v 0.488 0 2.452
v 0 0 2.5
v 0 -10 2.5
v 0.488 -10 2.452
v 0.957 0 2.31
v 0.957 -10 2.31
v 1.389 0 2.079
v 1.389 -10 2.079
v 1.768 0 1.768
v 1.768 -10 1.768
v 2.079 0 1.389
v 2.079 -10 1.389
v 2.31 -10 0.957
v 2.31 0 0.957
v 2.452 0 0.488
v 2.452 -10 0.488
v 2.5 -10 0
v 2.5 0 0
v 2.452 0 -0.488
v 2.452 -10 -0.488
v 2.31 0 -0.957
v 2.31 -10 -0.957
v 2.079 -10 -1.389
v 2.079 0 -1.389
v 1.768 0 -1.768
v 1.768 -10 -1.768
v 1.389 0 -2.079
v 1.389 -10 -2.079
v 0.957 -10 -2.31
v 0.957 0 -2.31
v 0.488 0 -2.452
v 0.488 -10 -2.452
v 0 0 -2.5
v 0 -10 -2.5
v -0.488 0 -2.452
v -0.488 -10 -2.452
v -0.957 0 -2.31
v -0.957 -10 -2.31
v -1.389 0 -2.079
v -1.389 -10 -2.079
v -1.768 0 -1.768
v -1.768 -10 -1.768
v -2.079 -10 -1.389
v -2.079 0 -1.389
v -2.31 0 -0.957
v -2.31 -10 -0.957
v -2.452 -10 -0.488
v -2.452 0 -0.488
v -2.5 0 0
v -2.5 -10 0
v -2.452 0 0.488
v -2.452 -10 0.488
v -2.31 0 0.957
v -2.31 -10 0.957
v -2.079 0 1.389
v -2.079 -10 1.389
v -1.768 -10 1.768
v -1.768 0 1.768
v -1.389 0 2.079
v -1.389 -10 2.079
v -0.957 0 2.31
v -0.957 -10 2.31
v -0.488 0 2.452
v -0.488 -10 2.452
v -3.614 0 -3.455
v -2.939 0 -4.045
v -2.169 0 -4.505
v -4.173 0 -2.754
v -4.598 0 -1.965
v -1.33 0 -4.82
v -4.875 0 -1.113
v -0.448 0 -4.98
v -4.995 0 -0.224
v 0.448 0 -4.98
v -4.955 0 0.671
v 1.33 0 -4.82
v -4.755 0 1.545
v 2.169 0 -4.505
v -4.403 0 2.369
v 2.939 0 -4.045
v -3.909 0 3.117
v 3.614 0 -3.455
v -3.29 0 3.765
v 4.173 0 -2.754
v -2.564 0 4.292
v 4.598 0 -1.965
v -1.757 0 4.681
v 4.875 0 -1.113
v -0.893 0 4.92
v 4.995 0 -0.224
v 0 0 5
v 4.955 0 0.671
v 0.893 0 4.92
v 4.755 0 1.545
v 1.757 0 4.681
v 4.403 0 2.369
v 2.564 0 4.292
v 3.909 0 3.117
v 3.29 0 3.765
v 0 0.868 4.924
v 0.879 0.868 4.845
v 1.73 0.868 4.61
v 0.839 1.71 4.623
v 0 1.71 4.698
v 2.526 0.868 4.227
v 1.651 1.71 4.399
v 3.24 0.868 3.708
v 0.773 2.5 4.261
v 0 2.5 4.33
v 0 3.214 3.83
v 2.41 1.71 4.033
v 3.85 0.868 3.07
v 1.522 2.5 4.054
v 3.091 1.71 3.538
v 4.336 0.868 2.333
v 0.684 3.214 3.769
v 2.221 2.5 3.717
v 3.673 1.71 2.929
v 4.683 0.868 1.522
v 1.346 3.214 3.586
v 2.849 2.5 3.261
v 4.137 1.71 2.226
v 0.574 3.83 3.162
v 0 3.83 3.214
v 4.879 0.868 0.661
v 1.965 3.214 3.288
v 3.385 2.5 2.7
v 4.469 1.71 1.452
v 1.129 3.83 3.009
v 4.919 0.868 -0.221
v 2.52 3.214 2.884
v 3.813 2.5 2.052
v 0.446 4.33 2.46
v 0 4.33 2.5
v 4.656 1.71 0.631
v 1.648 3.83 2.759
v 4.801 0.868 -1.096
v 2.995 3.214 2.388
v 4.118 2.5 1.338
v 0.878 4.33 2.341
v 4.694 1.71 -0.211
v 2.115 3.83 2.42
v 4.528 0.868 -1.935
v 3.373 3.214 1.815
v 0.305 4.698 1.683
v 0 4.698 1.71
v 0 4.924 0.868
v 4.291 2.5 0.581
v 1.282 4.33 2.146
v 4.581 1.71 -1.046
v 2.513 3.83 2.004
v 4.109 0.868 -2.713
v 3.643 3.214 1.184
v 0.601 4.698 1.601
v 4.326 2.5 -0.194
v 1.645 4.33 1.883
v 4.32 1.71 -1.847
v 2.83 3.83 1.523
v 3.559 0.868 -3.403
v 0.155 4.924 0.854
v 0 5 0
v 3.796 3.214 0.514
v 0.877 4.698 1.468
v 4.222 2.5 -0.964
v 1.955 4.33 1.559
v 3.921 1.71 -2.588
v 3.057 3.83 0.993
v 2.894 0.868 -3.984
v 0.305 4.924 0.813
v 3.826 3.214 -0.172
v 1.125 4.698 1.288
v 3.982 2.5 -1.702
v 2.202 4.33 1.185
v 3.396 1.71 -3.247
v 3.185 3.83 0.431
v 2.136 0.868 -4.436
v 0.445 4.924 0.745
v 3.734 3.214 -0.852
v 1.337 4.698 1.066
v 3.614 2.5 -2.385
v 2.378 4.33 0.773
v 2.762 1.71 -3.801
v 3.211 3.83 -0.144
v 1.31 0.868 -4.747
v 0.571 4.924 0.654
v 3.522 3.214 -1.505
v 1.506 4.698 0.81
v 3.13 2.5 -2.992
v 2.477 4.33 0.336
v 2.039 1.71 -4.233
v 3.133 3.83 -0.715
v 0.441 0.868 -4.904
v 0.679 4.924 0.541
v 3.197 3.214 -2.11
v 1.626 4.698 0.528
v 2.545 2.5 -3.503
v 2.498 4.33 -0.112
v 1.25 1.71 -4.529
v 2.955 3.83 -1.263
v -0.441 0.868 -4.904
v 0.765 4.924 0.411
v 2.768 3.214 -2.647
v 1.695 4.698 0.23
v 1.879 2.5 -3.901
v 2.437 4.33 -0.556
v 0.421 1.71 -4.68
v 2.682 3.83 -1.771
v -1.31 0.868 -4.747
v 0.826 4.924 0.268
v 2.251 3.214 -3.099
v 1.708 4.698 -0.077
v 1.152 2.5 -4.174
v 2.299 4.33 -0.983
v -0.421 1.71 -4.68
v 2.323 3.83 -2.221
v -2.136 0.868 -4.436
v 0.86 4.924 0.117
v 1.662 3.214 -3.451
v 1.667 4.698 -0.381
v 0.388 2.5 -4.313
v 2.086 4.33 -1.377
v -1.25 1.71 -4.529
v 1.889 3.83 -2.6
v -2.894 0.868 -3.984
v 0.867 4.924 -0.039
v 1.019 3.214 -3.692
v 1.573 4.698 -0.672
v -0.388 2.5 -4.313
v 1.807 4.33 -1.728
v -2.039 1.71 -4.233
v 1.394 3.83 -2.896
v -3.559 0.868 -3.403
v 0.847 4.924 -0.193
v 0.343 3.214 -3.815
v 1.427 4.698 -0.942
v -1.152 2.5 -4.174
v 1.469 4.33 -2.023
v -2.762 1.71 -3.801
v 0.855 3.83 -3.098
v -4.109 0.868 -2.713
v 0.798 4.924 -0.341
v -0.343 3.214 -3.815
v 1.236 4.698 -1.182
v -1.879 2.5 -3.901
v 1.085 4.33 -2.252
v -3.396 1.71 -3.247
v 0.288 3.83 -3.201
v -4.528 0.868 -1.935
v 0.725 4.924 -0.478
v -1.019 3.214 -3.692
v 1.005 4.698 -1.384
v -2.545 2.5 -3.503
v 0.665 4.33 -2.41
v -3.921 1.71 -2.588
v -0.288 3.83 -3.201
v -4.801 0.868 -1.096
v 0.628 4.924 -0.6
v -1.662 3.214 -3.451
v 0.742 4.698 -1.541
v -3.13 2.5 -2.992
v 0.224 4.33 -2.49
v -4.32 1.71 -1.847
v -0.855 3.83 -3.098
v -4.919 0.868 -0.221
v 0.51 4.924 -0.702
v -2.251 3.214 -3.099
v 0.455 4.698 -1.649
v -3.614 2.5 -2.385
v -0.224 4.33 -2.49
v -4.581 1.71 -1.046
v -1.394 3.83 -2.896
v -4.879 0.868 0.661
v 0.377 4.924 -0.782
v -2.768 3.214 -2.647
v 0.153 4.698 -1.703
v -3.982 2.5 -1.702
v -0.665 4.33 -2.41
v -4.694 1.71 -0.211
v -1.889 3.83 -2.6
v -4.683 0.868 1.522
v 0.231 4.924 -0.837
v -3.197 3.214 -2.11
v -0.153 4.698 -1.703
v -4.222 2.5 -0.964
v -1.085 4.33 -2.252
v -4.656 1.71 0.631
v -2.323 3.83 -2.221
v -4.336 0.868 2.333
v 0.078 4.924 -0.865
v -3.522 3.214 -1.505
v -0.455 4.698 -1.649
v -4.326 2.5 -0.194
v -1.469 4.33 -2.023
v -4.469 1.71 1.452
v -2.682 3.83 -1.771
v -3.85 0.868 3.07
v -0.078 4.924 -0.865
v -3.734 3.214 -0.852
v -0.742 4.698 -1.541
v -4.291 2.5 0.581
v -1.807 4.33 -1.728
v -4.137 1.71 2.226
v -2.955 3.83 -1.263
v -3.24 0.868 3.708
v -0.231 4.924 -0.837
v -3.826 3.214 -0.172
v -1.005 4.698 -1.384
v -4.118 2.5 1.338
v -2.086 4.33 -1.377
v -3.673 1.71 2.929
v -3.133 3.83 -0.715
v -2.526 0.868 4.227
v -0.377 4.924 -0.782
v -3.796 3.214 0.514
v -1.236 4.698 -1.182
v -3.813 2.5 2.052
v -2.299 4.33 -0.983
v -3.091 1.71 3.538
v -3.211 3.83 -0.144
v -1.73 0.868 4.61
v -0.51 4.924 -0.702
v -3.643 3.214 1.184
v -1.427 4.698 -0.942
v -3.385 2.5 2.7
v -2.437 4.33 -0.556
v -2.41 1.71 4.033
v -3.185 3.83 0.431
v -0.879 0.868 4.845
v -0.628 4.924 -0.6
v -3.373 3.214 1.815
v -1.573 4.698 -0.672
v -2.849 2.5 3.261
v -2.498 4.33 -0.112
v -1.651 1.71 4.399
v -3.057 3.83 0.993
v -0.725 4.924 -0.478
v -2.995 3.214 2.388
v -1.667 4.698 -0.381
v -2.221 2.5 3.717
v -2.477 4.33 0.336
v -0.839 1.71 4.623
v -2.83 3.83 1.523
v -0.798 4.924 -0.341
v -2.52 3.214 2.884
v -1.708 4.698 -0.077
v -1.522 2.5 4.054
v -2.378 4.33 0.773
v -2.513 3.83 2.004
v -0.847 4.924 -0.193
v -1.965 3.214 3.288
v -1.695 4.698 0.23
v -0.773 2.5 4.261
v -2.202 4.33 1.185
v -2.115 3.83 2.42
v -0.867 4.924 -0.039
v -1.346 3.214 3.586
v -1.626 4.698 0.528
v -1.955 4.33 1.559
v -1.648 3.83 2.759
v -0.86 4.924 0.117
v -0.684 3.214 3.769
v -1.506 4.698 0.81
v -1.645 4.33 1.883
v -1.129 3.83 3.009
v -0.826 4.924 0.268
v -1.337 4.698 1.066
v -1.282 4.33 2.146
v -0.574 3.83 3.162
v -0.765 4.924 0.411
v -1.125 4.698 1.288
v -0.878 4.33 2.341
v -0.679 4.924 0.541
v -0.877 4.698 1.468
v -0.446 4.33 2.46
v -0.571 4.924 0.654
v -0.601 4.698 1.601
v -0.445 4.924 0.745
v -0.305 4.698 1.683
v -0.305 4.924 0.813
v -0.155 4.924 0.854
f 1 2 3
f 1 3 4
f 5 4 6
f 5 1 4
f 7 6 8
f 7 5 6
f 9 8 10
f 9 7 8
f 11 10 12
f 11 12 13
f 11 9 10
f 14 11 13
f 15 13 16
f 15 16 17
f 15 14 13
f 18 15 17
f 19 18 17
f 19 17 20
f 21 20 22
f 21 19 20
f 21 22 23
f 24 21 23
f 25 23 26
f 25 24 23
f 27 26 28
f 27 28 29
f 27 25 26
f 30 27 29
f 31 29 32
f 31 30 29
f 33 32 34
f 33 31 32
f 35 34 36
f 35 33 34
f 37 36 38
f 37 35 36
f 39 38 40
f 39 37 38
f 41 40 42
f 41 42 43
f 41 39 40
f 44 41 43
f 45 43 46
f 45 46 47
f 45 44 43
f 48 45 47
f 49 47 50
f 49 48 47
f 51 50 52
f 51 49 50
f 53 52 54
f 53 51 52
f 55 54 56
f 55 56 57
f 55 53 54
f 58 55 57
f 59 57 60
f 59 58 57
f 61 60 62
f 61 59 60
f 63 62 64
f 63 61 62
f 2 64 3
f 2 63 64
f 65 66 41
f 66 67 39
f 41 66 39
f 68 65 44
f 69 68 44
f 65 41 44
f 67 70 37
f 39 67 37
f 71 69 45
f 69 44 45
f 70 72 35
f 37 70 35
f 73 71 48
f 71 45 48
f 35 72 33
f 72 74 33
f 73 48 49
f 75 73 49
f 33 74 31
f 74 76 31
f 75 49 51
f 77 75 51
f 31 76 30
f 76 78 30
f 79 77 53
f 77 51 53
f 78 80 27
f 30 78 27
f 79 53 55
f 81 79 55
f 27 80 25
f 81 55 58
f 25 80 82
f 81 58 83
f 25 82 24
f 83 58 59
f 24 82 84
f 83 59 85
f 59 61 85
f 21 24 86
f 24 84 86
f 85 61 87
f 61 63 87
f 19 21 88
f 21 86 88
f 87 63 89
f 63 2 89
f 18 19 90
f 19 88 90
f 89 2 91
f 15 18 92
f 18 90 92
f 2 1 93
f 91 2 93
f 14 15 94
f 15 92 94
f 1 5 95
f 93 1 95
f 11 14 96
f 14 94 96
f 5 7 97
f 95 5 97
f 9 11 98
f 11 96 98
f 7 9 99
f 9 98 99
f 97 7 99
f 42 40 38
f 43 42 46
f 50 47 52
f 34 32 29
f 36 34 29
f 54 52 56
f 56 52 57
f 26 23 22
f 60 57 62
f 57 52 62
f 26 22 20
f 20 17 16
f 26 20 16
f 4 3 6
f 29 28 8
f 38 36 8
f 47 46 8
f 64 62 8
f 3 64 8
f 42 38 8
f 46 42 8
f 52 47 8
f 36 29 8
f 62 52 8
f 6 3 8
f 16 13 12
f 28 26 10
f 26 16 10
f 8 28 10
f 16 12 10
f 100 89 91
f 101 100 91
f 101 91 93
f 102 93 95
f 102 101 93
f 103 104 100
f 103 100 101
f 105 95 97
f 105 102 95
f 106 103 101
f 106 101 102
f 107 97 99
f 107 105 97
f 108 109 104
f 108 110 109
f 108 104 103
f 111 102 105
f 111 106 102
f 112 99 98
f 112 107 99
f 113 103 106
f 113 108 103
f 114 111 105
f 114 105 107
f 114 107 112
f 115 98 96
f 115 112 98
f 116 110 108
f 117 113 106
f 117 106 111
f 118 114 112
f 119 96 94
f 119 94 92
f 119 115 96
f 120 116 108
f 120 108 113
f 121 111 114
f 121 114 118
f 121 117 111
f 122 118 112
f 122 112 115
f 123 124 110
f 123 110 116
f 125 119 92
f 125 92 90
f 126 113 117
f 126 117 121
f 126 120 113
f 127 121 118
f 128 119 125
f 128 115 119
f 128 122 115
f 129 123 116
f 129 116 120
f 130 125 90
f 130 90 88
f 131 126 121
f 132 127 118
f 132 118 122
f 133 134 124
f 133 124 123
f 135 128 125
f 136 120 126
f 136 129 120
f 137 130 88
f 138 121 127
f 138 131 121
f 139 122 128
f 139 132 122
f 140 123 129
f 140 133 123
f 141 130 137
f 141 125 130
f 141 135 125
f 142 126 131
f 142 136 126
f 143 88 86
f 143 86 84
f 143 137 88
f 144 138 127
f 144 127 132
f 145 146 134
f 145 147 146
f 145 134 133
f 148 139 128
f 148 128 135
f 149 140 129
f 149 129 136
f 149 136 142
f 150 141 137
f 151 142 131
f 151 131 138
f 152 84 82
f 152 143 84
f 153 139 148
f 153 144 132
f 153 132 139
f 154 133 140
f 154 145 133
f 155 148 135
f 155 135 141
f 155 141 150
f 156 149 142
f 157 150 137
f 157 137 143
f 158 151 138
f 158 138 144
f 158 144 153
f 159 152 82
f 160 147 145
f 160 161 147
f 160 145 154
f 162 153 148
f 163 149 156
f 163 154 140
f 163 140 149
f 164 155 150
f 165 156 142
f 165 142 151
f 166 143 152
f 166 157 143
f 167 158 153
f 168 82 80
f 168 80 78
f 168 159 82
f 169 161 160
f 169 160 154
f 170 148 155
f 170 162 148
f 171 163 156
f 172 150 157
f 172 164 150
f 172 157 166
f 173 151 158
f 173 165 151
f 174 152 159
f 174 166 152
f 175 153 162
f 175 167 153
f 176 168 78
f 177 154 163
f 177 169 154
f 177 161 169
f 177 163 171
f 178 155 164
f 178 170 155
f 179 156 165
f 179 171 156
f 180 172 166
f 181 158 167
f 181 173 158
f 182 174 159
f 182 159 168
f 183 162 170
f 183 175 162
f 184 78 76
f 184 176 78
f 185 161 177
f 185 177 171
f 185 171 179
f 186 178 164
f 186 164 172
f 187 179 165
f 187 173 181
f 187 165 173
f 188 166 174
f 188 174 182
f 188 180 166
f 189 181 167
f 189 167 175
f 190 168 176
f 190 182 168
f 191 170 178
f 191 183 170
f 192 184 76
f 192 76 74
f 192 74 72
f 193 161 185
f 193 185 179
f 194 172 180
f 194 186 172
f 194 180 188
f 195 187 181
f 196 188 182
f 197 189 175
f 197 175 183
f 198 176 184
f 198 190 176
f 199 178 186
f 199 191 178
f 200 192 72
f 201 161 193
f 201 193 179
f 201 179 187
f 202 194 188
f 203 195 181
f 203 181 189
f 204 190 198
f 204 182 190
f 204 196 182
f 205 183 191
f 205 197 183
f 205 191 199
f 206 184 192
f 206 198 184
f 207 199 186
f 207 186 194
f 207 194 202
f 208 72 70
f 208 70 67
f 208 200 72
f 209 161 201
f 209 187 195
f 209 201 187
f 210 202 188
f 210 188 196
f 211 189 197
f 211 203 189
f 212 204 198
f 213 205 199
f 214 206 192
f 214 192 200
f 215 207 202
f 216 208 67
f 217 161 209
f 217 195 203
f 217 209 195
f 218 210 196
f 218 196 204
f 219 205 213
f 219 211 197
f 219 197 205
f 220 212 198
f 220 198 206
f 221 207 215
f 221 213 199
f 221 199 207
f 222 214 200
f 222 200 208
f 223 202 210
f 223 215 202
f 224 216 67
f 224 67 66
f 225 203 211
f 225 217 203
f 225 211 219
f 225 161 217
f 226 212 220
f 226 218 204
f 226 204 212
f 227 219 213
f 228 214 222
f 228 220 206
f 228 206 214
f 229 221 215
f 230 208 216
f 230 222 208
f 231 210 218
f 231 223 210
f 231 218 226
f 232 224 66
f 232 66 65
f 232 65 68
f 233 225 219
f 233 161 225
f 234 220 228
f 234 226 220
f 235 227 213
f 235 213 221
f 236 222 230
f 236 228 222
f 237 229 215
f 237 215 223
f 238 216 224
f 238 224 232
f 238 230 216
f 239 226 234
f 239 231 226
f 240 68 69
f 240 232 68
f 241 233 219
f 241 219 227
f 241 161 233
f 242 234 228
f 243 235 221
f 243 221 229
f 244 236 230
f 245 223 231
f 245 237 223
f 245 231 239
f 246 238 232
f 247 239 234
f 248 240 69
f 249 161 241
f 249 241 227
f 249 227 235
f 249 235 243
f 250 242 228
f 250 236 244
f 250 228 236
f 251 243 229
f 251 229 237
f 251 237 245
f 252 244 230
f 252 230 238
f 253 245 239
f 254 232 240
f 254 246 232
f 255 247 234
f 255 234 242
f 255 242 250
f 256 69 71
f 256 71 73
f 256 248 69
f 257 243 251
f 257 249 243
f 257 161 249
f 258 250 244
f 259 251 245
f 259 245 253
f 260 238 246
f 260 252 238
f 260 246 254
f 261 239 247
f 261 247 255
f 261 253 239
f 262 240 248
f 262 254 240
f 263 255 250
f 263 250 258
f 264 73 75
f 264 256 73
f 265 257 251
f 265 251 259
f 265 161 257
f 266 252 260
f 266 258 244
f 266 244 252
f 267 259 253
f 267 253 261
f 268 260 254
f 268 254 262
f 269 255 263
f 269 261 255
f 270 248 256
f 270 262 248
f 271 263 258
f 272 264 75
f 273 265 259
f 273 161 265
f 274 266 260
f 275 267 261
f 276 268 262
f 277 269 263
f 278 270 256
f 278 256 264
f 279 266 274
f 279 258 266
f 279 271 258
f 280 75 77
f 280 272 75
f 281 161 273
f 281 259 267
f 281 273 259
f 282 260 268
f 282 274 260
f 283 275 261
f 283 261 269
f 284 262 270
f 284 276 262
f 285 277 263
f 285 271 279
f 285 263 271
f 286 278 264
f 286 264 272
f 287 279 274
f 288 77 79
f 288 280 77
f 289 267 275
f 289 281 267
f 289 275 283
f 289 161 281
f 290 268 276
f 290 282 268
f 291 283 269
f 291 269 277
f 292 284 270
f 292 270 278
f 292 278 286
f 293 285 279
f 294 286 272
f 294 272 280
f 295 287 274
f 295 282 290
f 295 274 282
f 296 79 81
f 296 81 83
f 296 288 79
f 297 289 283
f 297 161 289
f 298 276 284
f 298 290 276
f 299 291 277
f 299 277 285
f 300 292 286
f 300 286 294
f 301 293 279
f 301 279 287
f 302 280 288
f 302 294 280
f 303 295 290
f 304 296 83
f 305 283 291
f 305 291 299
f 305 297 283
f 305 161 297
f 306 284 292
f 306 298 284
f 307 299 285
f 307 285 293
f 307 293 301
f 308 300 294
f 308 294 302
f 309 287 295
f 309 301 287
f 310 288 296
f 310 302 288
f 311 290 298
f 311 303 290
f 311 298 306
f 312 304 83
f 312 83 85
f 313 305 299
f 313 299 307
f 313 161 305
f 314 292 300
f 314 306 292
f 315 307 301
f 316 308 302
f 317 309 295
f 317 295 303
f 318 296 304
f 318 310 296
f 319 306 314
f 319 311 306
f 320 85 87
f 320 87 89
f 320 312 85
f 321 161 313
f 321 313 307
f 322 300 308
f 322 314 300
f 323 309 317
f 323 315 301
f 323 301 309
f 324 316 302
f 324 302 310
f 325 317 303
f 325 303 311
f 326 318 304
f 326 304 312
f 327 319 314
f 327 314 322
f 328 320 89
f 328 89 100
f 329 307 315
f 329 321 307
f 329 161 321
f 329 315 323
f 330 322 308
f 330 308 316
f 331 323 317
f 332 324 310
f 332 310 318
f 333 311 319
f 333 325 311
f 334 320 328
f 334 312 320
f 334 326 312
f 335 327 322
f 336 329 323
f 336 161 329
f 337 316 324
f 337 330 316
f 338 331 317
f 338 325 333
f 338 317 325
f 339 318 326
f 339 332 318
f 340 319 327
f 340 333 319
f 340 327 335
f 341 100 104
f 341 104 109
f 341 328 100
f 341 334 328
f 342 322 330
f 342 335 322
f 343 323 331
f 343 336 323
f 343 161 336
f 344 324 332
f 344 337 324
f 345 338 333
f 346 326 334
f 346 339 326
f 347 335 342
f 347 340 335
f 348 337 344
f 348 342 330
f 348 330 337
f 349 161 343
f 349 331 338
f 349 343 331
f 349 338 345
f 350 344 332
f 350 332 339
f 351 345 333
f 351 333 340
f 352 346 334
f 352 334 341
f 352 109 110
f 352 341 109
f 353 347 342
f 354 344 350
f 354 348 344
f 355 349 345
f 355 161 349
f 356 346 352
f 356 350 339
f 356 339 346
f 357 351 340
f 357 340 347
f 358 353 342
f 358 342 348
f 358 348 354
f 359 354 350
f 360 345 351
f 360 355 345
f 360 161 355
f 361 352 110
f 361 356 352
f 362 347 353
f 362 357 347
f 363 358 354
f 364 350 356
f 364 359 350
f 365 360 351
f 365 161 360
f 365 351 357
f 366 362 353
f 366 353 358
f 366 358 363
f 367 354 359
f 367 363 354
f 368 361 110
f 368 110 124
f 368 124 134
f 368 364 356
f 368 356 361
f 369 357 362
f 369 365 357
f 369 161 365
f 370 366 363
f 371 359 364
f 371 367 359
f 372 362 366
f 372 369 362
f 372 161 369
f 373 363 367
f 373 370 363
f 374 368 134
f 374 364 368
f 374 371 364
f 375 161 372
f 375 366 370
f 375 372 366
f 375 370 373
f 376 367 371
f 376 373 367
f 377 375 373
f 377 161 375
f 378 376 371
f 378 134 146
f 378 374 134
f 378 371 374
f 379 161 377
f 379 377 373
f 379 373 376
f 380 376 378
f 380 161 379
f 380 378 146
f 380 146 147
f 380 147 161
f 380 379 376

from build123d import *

# Parameters (mm, degrees)
SKETCH1_R           = 2.5
BOSS_EXTRUDE1_DEPTH = 10
SKETCH2_R           = 5
BOSS_EXTRUDE2_DEPTH = 5
FILLET1_R           = 5


with BuildPart() as part:
    # Sketch1 → Boss-Extrude1 (new body)
    with BuildSketch(Plane(origin=(0, 0, 0), x_dir=(1, 0, 0), z_dir=(0, 1, 0))):
        with Locations(Location((0, 0, 0), (0, 0, 270))):
            Circle(SKETCH1_R)
    extrude(amount=-BOSS_EXTRUDE1_DEPTH)

    # Sketch2 → Boss-Extrude2 (add)
    with BuildSketch(Plane(origin=(0, 0, 0), x_dir=(1, 0, 0), z_dir=(0, 1, 0))):
        with Locations(Location((0, 0, 0), (0, 0, 270))):
            Circle(SKETCH2_R)
    extrude(amount=BOSS_EXTRUDE2_DEPTH)

    # Fillet1
    fillet1_edges = [part.edges().sort_by_distance(p)[0] for p in [
        (0, 5, -5),
    ]]
    fillet(fillet1_edges, radius=FILLET1_R - 0.0001)  # a hair under: the kernel refuses the full size


solid = part.part
